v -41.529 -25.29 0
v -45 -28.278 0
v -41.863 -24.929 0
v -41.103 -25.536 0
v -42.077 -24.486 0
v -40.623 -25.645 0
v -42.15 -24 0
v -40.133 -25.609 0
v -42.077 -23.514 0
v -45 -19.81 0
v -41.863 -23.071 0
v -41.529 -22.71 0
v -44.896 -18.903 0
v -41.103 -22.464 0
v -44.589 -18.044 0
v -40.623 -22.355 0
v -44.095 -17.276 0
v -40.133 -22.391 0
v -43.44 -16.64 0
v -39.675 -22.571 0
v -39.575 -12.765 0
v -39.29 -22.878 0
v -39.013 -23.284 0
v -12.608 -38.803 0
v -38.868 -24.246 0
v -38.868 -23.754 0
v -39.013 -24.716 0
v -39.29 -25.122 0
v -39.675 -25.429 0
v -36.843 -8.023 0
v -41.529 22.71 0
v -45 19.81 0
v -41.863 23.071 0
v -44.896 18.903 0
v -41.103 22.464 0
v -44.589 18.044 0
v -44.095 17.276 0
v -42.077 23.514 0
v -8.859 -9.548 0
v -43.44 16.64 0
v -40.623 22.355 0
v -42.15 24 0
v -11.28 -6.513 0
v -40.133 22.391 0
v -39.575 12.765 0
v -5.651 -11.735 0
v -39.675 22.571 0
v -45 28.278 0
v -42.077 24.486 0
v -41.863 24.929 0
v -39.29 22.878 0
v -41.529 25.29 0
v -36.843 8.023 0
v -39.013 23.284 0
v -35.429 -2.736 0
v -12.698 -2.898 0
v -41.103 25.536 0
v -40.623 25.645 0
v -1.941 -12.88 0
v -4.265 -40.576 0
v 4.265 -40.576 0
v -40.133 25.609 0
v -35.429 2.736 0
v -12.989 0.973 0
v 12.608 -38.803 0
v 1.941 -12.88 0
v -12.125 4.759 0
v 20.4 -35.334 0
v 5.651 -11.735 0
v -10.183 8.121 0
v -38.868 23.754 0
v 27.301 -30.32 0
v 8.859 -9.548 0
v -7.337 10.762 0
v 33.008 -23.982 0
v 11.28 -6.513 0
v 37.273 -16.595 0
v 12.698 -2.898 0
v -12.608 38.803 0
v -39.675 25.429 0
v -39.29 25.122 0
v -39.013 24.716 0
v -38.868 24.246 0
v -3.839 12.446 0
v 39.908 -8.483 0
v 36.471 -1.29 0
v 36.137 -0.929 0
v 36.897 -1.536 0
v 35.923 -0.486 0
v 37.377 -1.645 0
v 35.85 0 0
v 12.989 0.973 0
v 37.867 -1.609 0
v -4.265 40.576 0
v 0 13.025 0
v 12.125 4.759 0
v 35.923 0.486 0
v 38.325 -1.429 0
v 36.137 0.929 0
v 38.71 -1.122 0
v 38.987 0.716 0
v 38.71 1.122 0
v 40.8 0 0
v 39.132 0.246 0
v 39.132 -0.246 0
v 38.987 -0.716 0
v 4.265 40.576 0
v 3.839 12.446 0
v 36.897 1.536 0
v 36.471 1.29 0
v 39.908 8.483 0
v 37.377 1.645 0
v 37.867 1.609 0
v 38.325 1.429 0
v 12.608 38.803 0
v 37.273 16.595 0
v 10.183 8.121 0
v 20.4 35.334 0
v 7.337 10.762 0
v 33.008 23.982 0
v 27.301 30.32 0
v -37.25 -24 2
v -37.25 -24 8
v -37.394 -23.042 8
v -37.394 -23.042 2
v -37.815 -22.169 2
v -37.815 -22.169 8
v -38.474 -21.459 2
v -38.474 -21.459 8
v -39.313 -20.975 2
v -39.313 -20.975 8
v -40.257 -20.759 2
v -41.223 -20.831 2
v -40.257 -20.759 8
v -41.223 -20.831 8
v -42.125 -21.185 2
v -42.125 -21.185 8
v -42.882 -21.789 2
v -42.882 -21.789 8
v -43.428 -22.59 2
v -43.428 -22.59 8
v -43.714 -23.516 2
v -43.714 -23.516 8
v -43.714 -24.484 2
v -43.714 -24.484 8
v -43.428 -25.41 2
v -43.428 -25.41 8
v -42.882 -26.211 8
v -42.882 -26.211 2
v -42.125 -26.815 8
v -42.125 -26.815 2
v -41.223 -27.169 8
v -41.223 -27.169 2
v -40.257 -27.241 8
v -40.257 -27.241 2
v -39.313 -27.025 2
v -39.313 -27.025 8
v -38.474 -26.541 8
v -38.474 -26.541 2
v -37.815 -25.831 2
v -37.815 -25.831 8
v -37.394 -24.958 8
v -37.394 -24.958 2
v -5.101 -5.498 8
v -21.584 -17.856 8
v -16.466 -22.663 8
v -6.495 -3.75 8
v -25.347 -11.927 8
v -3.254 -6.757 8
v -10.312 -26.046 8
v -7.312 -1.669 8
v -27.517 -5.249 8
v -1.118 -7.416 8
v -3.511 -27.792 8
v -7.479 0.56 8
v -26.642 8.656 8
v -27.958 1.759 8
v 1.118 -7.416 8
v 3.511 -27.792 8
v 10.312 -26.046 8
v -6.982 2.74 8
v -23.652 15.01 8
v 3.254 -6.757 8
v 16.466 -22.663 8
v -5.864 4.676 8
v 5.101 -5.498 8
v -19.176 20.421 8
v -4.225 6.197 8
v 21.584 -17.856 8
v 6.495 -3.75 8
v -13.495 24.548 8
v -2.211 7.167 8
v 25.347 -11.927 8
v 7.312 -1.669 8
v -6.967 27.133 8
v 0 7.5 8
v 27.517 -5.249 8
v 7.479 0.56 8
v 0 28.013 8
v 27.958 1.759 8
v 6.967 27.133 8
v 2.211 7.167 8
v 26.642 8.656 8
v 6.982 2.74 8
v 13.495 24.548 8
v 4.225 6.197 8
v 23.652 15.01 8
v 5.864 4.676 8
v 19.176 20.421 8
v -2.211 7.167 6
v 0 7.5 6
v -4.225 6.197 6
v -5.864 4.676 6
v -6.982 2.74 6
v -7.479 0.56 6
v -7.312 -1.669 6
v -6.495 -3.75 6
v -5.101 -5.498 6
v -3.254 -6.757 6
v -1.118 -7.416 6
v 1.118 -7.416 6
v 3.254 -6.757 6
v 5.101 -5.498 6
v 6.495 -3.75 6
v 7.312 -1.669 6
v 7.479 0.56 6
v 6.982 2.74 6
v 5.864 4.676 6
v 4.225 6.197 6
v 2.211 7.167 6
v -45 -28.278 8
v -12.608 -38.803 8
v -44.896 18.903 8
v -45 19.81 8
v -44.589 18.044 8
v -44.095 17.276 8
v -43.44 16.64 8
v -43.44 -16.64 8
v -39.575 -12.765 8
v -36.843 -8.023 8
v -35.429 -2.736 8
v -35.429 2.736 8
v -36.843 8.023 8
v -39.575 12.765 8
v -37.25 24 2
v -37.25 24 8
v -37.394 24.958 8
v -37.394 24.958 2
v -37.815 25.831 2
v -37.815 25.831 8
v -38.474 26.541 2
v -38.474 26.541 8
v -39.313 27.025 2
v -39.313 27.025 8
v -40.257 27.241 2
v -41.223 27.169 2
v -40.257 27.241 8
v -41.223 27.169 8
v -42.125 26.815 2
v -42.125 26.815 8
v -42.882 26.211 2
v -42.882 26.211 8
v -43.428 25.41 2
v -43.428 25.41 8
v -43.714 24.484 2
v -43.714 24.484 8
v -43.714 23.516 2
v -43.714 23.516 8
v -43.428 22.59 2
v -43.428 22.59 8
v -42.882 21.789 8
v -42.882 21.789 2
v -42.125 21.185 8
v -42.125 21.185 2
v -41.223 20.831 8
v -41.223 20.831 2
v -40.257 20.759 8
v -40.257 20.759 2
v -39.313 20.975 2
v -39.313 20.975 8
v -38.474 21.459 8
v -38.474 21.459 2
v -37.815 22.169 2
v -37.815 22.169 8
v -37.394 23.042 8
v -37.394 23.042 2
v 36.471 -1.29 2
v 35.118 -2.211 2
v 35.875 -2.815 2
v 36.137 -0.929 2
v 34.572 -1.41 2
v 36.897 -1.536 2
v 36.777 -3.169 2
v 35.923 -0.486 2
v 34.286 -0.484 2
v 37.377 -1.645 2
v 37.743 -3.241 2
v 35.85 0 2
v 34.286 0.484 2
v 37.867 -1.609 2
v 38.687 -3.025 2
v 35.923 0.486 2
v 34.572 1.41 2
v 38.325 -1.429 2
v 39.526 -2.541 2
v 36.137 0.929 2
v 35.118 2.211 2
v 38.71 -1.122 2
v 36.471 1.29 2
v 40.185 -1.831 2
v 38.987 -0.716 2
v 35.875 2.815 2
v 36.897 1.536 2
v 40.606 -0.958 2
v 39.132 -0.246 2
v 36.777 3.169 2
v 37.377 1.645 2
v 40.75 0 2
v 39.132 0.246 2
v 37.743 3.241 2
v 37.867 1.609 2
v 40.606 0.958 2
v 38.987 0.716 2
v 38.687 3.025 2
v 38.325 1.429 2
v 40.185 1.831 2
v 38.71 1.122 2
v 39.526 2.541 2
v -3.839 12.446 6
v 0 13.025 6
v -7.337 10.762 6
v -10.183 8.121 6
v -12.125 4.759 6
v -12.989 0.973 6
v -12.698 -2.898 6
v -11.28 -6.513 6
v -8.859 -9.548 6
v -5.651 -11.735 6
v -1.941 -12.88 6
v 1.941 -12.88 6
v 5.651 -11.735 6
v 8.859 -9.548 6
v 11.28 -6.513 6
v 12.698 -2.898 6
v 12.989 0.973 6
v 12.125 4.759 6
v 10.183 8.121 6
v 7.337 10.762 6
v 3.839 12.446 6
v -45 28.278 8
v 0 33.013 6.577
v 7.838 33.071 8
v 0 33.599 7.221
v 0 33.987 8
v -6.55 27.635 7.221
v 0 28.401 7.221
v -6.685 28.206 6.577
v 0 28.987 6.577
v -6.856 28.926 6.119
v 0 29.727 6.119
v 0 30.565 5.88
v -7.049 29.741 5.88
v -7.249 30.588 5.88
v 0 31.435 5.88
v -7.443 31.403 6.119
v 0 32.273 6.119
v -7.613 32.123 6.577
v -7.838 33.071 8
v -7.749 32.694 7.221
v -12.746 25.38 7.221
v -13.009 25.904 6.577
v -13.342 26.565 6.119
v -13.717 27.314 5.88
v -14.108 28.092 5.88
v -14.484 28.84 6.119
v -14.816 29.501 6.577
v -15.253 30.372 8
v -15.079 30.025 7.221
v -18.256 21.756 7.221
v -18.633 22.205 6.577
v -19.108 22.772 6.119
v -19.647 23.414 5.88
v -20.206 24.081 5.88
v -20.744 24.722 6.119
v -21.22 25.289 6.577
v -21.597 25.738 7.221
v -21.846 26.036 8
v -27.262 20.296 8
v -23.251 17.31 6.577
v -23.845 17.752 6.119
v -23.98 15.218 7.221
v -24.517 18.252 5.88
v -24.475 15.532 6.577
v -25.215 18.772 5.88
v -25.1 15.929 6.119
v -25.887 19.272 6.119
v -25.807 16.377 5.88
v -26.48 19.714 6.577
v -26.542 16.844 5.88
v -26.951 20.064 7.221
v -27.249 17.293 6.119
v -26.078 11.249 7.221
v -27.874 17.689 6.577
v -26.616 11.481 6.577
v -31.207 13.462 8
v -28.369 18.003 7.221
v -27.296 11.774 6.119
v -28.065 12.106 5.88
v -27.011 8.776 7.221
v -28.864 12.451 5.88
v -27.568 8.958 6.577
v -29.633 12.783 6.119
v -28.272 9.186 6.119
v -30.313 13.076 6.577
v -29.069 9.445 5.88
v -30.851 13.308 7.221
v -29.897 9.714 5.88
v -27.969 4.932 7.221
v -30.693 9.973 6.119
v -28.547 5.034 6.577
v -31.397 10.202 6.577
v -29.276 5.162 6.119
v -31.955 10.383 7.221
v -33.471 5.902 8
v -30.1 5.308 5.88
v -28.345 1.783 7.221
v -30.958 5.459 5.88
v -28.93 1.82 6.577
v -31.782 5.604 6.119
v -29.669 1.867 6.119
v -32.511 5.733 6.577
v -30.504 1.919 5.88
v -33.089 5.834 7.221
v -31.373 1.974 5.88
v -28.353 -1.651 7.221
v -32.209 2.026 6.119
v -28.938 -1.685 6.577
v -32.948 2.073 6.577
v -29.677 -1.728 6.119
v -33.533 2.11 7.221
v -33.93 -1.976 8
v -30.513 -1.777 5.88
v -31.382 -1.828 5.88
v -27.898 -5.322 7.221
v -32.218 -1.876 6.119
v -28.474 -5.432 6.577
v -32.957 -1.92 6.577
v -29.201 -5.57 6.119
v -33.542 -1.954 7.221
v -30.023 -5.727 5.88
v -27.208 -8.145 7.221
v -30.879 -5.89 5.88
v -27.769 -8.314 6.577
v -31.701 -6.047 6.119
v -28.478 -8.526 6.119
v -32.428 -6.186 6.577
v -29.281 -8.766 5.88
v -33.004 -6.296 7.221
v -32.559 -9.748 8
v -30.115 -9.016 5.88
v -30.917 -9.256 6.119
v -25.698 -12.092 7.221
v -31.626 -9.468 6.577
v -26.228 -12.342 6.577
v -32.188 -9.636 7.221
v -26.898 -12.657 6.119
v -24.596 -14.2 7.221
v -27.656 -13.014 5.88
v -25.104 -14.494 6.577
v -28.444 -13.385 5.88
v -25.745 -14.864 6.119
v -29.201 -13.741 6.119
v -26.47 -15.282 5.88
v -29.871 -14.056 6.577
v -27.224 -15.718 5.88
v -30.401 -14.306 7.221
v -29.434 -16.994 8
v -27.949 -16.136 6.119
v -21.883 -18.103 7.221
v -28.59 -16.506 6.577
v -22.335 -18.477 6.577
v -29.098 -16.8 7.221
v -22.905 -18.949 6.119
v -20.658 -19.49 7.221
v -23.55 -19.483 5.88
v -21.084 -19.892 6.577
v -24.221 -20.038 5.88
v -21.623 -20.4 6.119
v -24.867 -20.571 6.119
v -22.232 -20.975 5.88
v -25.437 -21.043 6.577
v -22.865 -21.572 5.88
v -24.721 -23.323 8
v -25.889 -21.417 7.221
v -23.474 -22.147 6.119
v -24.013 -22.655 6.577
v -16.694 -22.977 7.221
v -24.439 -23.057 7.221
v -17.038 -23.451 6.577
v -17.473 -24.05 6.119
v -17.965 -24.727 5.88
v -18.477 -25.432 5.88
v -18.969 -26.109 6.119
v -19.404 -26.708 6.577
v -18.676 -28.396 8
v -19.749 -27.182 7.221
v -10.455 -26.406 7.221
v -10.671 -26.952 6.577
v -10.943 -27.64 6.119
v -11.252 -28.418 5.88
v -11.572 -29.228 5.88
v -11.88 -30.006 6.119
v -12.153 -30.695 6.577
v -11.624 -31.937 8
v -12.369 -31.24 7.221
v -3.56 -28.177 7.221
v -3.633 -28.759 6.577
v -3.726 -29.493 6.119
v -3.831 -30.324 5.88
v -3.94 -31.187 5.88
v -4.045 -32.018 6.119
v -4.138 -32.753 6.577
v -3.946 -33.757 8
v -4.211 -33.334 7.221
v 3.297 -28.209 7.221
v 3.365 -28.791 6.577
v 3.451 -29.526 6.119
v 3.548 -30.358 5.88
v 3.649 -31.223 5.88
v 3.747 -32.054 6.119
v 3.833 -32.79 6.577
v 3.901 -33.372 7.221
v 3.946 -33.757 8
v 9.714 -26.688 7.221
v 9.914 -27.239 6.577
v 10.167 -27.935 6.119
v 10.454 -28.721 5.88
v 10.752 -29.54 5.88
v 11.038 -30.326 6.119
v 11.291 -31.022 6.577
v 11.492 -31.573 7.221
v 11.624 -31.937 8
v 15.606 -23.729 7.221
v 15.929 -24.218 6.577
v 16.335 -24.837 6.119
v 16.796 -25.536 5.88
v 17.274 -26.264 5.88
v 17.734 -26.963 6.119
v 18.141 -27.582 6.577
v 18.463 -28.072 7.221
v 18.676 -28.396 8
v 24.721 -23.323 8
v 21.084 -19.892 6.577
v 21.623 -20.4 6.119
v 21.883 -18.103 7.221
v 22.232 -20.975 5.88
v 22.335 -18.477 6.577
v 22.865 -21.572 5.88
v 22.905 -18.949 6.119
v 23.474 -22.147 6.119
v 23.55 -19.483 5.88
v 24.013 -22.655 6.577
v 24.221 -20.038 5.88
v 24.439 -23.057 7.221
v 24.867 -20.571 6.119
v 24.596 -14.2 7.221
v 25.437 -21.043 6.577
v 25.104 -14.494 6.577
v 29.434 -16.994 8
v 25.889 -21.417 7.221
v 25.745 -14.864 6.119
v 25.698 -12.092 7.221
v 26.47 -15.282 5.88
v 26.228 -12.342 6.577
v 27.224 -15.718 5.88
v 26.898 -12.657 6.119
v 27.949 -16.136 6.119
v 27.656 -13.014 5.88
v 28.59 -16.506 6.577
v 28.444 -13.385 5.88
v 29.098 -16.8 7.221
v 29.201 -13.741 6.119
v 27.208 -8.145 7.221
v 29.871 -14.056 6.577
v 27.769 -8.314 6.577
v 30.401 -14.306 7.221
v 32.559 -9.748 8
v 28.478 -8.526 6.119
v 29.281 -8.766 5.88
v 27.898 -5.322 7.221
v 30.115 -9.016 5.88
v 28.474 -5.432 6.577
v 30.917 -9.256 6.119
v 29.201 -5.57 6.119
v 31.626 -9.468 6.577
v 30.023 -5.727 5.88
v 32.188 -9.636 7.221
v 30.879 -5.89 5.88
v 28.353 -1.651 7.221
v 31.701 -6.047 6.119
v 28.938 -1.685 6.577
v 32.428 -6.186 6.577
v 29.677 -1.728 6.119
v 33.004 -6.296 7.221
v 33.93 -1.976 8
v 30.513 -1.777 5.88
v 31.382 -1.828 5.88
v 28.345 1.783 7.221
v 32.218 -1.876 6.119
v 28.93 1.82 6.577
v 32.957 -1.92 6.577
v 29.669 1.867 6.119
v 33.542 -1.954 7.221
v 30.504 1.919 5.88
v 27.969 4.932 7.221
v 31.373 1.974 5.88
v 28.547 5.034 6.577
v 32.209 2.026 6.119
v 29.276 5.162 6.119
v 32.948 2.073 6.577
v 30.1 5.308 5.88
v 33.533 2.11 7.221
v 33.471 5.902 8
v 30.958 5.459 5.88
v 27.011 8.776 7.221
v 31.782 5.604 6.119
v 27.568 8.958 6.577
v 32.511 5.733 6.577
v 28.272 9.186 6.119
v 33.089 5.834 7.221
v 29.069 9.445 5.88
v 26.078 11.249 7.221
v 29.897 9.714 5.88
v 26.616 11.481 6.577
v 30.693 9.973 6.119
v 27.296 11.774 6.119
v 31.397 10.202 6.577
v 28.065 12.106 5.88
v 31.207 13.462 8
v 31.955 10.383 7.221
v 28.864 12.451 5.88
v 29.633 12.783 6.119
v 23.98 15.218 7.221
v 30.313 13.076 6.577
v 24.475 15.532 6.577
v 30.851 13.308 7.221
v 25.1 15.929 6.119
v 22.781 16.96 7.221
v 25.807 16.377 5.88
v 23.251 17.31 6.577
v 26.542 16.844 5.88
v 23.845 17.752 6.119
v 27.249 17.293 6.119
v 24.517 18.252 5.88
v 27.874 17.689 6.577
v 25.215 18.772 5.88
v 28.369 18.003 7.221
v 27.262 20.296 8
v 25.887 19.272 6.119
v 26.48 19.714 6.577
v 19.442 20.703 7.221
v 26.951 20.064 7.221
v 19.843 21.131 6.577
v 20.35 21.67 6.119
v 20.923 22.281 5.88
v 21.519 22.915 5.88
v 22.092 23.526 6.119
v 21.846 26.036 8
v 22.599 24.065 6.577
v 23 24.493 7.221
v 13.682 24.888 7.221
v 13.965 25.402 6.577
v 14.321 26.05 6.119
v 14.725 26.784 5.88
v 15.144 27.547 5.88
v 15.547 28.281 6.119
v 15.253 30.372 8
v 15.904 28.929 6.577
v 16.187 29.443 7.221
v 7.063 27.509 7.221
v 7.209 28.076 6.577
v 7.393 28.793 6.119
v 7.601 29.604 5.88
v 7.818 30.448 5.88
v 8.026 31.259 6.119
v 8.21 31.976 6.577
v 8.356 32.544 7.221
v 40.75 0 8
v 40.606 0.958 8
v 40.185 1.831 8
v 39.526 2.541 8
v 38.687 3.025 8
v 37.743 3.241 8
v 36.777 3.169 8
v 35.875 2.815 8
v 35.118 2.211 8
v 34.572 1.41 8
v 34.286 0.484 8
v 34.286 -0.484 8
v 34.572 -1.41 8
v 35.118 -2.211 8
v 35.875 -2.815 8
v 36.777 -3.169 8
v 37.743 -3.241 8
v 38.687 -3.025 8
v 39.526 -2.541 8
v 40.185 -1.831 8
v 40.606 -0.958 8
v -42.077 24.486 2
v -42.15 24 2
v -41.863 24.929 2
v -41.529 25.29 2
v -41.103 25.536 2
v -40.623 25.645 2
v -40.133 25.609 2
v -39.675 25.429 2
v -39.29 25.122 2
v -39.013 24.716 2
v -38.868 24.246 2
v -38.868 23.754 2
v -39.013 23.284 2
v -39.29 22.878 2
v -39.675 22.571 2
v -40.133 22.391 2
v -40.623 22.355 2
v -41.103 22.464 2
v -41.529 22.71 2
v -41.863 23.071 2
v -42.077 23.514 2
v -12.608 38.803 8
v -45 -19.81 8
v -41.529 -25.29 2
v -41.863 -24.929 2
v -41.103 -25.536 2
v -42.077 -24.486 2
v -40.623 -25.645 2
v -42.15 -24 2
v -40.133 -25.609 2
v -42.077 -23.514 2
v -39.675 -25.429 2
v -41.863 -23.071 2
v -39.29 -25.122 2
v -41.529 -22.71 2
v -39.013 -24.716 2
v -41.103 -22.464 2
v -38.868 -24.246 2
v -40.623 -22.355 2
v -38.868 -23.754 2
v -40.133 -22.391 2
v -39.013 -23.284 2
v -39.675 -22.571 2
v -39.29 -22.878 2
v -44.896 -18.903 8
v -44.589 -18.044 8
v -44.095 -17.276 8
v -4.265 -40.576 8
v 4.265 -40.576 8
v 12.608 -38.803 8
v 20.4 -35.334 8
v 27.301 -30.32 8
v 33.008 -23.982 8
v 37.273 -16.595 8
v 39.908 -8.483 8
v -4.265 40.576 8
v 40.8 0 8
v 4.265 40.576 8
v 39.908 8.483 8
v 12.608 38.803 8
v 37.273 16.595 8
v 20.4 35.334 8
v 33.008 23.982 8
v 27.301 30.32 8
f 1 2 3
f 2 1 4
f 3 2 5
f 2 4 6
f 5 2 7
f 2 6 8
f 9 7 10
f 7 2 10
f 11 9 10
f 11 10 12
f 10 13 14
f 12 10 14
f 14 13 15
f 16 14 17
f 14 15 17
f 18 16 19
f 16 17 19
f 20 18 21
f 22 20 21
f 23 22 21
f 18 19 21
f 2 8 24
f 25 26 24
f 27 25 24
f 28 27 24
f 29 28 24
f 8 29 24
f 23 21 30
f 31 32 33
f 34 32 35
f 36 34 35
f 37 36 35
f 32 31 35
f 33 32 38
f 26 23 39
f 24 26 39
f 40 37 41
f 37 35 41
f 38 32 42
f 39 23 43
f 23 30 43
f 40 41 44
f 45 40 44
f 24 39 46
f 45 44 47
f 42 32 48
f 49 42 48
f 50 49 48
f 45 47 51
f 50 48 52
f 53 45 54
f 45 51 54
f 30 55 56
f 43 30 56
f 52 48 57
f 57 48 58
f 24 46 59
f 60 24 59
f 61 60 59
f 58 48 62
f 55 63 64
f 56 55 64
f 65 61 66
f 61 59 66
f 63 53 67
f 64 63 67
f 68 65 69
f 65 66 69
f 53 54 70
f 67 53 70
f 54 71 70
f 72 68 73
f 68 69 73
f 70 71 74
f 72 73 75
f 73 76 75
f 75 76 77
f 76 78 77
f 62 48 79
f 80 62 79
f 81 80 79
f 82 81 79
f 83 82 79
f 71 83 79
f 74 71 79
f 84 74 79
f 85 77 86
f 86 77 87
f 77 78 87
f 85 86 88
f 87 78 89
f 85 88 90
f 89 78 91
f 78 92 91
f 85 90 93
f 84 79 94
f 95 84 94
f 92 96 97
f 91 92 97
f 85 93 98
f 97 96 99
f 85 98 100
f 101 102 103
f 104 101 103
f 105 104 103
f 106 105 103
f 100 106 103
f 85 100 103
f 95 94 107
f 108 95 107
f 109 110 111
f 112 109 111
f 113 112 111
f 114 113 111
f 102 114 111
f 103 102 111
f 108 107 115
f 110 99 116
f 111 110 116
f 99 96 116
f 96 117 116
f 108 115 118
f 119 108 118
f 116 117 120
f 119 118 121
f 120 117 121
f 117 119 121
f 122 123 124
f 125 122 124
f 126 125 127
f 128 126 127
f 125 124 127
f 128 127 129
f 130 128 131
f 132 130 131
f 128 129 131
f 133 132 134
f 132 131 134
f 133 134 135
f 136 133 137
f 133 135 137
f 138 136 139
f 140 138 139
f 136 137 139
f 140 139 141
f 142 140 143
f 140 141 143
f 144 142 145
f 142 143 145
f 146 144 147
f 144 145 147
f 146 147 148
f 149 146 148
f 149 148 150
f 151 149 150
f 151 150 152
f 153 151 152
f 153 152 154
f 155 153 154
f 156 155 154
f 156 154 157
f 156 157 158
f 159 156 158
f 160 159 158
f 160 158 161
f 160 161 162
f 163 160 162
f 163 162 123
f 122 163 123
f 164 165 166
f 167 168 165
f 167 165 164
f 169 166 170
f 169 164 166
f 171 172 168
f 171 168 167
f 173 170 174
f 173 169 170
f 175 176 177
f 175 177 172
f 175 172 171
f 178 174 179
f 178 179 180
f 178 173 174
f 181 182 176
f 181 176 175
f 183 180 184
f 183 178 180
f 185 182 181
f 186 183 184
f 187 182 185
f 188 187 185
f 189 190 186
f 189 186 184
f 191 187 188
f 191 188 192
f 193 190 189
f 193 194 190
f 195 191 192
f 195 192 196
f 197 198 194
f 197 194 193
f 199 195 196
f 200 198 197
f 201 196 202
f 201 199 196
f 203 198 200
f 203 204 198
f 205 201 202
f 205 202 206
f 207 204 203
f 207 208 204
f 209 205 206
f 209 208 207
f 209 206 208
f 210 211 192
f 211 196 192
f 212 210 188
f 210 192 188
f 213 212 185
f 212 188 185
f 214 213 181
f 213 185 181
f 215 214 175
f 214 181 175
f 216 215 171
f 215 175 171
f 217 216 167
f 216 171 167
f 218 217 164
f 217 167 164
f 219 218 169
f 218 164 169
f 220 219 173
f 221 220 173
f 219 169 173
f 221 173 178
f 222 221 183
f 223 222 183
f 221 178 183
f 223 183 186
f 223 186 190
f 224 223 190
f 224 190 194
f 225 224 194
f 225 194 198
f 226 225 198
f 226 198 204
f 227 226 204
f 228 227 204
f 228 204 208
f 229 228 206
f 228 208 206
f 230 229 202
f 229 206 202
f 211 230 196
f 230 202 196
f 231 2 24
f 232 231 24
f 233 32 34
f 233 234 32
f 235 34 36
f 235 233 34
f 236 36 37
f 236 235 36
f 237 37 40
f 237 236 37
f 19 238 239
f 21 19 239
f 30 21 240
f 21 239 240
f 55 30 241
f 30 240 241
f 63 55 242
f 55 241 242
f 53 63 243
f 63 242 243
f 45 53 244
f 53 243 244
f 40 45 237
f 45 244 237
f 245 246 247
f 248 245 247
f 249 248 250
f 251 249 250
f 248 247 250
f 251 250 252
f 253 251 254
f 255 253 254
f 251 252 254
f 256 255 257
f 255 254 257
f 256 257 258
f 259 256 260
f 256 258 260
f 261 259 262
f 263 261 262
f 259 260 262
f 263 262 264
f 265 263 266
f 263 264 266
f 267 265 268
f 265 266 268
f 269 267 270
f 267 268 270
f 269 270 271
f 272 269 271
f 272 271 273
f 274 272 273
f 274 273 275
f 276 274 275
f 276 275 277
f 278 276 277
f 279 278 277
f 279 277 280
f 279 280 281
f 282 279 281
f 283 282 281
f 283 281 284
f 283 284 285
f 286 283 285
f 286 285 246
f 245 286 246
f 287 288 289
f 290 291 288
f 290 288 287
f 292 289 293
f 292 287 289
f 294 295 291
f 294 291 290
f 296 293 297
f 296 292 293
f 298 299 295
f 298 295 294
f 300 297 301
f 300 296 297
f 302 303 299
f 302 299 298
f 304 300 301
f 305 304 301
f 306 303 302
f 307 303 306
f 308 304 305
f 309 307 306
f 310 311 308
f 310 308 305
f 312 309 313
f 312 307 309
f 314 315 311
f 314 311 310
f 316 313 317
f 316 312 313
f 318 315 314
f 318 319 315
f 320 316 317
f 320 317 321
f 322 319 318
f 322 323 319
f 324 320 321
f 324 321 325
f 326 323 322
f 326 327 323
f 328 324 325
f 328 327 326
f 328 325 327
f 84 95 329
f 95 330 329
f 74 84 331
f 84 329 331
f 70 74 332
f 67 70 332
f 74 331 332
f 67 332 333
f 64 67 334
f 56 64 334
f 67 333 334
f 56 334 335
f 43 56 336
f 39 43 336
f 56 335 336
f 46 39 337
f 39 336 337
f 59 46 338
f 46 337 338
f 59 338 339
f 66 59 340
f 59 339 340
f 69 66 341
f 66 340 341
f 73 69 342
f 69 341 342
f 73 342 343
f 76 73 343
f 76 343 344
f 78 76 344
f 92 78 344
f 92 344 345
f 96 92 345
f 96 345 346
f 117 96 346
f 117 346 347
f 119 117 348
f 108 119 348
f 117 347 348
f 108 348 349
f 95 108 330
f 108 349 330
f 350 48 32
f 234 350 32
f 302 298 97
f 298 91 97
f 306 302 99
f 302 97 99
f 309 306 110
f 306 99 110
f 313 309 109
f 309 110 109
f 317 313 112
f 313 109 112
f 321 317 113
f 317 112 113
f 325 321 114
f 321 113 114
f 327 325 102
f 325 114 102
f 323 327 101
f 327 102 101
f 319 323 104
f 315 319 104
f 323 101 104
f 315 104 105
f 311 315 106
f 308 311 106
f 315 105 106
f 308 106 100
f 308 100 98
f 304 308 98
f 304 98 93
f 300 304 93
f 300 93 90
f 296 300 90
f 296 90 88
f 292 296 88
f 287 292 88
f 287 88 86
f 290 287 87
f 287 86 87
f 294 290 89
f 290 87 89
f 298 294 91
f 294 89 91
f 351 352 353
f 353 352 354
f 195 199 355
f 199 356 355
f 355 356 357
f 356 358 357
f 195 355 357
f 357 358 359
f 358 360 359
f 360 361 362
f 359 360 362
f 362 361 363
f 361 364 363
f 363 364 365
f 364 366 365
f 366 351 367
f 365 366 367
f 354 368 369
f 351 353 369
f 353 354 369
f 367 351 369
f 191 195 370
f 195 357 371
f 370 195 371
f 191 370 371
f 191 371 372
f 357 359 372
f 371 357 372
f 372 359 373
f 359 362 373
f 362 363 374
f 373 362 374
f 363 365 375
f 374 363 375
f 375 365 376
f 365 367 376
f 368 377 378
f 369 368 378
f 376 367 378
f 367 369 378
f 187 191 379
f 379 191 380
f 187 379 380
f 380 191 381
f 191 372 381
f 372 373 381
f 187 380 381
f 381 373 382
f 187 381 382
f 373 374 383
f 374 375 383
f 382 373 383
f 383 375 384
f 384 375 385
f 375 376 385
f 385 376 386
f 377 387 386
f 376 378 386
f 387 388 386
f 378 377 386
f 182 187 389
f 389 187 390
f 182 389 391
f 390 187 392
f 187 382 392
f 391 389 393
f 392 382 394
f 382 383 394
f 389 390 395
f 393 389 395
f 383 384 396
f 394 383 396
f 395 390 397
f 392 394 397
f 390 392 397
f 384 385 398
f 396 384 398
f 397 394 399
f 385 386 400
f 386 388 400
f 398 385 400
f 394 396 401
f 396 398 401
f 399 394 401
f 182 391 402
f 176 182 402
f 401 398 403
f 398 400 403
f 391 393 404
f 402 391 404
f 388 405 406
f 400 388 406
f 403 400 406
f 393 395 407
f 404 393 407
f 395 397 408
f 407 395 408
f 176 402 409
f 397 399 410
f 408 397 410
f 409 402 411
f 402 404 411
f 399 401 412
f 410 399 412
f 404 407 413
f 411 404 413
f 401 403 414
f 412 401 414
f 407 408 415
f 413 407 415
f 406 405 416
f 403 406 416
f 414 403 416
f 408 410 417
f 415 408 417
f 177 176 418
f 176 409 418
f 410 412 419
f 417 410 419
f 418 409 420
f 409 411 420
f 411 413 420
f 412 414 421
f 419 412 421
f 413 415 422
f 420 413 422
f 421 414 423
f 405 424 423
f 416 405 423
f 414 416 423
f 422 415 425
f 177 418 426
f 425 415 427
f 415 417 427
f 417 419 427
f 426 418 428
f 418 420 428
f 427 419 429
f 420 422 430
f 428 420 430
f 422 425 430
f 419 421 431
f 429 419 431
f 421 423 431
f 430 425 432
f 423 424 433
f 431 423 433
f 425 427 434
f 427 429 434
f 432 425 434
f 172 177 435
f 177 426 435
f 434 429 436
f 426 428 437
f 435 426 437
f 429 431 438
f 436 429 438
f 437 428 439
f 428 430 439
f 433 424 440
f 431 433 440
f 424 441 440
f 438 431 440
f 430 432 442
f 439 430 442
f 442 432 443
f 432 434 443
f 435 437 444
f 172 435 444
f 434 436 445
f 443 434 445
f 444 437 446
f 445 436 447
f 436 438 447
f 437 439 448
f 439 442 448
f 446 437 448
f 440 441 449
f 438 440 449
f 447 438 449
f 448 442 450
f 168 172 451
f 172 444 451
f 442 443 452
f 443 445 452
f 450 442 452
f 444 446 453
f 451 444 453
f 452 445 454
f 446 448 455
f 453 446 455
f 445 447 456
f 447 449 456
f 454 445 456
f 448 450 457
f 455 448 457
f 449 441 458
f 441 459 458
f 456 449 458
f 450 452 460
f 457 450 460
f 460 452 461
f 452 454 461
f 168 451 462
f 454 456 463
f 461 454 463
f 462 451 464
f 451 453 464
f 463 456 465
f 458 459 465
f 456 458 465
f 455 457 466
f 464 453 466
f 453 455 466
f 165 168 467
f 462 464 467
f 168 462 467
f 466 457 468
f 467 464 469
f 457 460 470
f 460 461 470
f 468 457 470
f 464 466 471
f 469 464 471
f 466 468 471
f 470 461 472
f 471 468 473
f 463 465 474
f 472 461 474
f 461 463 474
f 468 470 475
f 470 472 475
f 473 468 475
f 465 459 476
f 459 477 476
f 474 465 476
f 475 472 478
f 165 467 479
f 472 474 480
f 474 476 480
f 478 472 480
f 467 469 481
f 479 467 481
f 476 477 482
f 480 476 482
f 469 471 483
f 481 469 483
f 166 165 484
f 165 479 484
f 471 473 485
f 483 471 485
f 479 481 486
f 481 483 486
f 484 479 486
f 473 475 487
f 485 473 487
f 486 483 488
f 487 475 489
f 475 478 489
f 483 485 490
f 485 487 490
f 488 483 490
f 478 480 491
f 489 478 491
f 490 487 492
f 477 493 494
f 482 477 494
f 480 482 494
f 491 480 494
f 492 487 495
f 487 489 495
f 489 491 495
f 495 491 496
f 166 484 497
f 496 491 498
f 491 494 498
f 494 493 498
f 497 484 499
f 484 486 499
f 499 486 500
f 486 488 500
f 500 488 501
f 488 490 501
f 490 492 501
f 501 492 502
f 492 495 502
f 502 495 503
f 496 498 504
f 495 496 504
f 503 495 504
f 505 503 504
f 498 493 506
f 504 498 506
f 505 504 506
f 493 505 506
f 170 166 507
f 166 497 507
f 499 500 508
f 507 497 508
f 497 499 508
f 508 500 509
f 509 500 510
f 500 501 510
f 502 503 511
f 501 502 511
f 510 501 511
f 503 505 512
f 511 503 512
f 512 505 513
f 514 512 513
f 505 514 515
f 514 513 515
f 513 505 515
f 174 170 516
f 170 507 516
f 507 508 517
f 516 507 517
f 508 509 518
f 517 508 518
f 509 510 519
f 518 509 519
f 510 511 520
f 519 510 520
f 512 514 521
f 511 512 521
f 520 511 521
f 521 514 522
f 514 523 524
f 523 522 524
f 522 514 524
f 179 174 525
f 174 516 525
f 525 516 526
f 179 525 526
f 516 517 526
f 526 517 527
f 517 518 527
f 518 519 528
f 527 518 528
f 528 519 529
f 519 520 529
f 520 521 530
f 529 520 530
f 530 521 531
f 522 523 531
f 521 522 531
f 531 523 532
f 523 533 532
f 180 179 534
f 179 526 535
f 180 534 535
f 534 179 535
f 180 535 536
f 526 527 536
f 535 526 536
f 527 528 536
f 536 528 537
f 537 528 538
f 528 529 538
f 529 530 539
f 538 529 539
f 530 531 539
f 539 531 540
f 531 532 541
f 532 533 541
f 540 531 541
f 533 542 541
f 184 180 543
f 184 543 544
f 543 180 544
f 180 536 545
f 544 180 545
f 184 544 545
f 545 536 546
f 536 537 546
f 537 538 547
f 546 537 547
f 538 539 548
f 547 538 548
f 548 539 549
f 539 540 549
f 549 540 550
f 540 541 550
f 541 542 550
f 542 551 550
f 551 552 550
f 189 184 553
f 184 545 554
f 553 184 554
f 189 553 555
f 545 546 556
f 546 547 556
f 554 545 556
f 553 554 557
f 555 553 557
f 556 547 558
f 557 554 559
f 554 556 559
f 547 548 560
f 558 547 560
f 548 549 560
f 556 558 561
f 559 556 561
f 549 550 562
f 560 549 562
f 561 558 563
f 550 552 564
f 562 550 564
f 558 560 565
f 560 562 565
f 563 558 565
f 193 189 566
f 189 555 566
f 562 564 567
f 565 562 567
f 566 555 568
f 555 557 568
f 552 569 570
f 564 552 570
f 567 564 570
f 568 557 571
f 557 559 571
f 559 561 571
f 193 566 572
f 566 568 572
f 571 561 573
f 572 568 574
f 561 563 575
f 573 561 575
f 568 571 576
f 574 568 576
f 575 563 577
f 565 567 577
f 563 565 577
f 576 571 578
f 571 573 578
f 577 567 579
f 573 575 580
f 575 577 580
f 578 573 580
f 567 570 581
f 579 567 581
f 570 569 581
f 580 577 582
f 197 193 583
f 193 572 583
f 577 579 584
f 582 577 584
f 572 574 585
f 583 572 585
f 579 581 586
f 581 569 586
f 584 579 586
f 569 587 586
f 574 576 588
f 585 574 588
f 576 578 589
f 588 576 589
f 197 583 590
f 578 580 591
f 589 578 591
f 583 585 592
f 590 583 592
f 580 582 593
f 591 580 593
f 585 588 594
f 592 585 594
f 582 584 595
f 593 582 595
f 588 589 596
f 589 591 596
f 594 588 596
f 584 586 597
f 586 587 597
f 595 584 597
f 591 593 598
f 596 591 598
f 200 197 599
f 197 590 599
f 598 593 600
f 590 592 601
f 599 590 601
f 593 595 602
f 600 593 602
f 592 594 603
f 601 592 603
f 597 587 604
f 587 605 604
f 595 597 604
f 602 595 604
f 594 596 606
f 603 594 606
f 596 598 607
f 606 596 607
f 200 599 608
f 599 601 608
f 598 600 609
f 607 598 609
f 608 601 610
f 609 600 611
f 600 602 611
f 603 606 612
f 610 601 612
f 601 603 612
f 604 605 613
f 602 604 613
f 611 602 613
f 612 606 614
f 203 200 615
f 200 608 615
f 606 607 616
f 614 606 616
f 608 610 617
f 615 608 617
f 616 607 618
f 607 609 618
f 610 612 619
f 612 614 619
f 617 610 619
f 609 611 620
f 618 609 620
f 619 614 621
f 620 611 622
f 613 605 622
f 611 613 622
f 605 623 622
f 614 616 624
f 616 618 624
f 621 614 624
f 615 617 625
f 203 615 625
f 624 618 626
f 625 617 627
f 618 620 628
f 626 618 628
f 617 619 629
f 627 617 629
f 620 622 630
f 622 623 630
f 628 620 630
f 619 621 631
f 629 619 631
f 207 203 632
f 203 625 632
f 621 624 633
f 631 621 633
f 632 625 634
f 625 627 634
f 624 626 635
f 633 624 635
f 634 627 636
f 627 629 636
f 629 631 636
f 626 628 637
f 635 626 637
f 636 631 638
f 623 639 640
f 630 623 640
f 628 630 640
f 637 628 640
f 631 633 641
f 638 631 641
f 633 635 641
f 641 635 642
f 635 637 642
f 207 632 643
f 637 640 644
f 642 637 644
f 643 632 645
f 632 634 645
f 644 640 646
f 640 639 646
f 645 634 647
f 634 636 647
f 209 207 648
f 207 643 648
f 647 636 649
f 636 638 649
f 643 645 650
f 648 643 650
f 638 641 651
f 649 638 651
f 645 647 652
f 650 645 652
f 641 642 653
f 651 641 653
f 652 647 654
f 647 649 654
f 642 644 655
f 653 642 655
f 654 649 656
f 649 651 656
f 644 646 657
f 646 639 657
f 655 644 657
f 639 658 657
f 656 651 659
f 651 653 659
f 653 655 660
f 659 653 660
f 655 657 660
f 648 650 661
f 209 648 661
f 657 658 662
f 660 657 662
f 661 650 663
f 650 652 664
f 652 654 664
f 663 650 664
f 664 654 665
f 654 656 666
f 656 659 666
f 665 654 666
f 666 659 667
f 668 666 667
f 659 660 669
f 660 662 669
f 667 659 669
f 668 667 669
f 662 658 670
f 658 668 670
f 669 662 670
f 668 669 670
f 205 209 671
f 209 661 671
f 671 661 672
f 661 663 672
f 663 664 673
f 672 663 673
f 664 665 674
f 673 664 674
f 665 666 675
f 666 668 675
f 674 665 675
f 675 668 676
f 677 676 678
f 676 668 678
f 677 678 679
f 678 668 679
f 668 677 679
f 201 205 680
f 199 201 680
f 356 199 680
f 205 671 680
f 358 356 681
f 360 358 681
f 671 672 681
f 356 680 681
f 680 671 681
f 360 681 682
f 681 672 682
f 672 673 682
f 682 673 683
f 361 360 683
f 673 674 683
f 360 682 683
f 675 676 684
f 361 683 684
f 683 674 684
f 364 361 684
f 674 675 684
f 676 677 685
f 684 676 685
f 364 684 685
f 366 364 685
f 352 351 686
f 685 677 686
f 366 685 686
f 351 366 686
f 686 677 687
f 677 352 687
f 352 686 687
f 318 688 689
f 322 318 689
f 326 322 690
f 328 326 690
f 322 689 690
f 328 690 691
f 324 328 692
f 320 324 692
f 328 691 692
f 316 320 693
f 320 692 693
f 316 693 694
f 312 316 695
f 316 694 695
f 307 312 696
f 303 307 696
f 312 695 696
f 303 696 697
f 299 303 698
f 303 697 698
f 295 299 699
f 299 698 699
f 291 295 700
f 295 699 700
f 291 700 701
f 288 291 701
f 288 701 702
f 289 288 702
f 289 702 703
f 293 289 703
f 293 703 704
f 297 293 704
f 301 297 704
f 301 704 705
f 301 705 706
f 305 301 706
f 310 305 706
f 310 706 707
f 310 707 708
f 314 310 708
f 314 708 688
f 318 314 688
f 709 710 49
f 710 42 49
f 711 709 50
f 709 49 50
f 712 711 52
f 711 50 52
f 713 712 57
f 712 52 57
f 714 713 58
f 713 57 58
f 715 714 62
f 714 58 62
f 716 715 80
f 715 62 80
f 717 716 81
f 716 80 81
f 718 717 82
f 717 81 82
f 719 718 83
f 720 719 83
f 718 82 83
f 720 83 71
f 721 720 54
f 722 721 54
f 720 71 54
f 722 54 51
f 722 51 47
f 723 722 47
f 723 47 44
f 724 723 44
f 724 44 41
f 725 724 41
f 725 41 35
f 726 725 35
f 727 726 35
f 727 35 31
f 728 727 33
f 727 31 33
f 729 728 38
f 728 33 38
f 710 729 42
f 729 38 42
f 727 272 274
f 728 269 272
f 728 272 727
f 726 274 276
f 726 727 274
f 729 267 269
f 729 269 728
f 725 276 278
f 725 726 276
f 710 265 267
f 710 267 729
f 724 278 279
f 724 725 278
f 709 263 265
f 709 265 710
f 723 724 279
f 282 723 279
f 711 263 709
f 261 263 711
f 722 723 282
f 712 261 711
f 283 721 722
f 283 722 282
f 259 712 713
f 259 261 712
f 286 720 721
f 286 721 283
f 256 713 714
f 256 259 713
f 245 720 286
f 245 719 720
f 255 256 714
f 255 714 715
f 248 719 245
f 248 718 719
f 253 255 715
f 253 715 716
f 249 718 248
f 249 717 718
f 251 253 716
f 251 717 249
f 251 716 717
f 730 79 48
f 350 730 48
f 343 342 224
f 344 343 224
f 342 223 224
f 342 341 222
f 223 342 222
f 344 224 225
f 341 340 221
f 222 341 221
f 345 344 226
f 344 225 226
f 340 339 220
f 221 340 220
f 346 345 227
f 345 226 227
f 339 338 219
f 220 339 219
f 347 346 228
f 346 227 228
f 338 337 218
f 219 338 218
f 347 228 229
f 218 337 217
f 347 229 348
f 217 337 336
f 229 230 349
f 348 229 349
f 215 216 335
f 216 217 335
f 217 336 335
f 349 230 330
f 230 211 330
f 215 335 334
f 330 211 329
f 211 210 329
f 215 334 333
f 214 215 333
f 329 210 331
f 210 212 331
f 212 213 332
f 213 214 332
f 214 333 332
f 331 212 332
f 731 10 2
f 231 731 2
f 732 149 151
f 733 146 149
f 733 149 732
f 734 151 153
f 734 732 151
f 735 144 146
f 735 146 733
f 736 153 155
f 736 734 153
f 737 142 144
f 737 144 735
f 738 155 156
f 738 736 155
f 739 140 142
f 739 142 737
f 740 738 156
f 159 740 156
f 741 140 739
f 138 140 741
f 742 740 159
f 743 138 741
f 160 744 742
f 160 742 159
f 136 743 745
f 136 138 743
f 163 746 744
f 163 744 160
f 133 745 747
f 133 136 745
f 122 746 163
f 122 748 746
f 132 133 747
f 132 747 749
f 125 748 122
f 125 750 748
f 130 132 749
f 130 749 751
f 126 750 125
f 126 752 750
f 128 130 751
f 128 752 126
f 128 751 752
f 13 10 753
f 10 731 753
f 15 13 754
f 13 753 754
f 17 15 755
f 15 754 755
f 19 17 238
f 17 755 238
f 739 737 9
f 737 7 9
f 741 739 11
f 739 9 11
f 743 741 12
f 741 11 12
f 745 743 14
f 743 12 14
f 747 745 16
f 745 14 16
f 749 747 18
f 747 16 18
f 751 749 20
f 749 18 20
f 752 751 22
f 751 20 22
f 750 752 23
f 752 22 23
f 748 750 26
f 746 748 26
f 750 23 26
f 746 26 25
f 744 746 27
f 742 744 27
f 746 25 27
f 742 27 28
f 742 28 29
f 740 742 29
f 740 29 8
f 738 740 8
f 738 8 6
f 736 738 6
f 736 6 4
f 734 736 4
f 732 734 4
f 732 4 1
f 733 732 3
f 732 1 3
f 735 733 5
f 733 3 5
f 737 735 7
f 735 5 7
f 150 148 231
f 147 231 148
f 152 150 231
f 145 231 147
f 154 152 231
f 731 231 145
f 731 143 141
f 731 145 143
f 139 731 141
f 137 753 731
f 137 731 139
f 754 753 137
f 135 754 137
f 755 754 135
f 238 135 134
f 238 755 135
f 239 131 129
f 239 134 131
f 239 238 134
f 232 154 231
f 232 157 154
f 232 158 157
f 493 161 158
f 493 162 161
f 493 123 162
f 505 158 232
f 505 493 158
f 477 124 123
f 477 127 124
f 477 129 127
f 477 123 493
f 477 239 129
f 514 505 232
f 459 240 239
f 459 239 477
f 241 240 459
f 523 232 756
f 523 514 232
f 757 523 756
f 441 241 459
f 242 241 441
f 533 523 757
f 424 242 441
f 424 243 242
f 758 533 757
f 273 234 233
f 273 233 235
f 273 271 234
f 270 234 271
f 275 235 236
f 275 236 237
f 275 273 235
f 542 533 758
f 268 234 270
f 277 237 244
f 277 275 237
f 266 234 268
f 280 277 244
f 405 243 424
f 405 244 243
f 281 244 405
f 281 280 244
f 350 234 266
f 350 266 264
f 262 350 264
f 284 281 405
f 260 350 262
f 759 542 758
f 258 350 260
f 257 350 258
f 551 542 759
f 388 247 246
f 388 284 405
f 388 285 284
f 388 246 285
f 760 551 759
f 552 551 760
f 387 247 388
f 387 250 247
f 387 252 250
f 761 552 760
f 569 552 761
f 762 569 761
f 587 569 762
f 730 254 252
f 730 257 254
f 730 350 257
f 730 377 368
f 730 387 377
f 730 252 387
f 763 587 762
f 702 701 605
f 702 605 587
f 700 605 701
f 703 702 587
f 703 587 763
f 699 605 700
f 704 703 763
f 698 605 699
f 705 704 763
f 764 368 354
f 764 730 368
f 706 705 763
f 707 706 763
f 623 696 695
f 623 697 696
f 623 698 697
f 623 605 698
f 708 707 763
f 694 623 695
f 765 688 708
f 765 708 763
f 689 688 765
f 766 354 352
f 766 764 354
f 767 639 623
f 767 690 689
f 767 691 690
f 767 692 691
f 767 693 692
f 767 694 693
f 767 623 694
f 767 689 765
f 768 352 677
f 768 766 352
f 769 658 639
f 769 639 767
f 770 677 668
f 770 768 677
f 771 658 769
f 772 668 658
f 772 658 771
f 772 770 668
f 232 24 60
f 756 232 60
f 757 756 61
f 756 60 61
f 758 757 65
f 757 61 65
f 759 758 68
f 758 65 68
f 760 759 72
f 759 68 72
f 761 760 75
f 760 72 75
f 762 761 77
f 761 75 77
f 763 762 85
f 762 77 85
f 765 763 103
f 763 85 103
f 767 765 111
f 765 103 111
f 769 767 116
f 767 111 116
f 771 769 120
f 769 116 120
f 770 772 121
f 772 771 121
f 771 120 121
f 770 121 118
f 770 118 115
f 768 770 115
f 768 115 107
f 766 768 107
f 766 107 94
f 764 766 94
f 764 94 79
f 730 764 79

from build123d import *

# Parameters (mm, degrees)
F0_R            = 40.8
F1_DEPTH        = 8
F4_R            = 3.15
F6_W            = 4.8
F6_H            = 38.4
F7_DEPTH        = 8.001
F9_DEPTH        = 8
F10_R           = 21
F11_DEPTH       = 8.001
F12_R           = 4
F14_D           = 3.3
F14_CBORE_D     = 6.5
F14_CBORE_DEPTH = 6


with BuildPart() as f1:
    # F0 (on Top) → F1 (new body)
    with BuildSketch(Plane.XY):
        Circle(F0_R)
    extrude(amount=F1_DEPTH)

    # F2 (on Right) → F3 (revolve, cut)
    with BuildSketch(Plane.YZ):
        Polygon((0, 8), (0, 0), (13.025, 0), (13.025, 6), (7.5, 6), (7.5, 8), align=None)
    revolve(axis=Axis((0, 0, 10.7360328796), (0, 0, 1)), mode=Mode.SUBTRACT)

    # F4 (on Right) → F5 (revolve, cut)
    with BuildSketch(Plane.YZ):
        with Locations((31, 9)):
            Circle(F4_R)
    revolve(axis=Axis((0, 0, 6.3867427816), (0, 0, 1)), mode=Mode.SUBTRACT)

    # F6 (on Top) → F7 (cut, through all)
    with BuildSketch(Plane.XY):
        with Locations((-38.4, 0)):
            Rectangle(F6_W, F6_H)
    extrude(amount=F7_DEPTH, mode=Mode.SUBTRACT)

    # F8 (on Top) → F9 (join, through all)
    with BuildSketch(Plane.XY):
        with BuildLine():
            Line((-45, 28.2782724184), (-45, -28.2782724184))
            Line((-45, -28.2782724184), (-12.6078933705, -38.8031058648))
            ThreePointArc((-12.6078933705, -38.8031058648), (-26.2059585661, -31.2711965814), (-36, -19.2))
            Line((-36, -19.2), (-36, 19.2))
            ThreePointArc((-36, 19.2), (-26.2059585661, 31.2711965814), (-12.6078933705, 38.8031058648))
            Line((-12.6078933705, 38.8031058648), (-45, 28.2782724184))
        make_face()
    extrude(amount=F9_DEPTH)

    # F10 (on face) → F11 (cut, through all)
    with BuildSketch(Plane.XY.offset(8)):
        with Locations((-56.25, 0)):
            Circle(F10_R)
    extrude(amount=-F11_DEPTH, mode=Mode.SUBTRACT)

    # F12
    f12_edges = [f1.edges().sort_by_distance(p)[0] for p in [
        (-45, -17.732386, 4),
        (-45, 17.732386, 4),
    ]]
    fillet(f12_edges, radius=F12_R)

    # F14 (through all)
    with Locations(Plane.XY.offset(8)):
        with Locations((-40.5, 24), (-40.5, -24), (37.5, 0)):
            CounterBoreHole(F14_D / 2, F14_CBORE_D / 2, F14_CBORE_DEPTH)


solid = f1.part
